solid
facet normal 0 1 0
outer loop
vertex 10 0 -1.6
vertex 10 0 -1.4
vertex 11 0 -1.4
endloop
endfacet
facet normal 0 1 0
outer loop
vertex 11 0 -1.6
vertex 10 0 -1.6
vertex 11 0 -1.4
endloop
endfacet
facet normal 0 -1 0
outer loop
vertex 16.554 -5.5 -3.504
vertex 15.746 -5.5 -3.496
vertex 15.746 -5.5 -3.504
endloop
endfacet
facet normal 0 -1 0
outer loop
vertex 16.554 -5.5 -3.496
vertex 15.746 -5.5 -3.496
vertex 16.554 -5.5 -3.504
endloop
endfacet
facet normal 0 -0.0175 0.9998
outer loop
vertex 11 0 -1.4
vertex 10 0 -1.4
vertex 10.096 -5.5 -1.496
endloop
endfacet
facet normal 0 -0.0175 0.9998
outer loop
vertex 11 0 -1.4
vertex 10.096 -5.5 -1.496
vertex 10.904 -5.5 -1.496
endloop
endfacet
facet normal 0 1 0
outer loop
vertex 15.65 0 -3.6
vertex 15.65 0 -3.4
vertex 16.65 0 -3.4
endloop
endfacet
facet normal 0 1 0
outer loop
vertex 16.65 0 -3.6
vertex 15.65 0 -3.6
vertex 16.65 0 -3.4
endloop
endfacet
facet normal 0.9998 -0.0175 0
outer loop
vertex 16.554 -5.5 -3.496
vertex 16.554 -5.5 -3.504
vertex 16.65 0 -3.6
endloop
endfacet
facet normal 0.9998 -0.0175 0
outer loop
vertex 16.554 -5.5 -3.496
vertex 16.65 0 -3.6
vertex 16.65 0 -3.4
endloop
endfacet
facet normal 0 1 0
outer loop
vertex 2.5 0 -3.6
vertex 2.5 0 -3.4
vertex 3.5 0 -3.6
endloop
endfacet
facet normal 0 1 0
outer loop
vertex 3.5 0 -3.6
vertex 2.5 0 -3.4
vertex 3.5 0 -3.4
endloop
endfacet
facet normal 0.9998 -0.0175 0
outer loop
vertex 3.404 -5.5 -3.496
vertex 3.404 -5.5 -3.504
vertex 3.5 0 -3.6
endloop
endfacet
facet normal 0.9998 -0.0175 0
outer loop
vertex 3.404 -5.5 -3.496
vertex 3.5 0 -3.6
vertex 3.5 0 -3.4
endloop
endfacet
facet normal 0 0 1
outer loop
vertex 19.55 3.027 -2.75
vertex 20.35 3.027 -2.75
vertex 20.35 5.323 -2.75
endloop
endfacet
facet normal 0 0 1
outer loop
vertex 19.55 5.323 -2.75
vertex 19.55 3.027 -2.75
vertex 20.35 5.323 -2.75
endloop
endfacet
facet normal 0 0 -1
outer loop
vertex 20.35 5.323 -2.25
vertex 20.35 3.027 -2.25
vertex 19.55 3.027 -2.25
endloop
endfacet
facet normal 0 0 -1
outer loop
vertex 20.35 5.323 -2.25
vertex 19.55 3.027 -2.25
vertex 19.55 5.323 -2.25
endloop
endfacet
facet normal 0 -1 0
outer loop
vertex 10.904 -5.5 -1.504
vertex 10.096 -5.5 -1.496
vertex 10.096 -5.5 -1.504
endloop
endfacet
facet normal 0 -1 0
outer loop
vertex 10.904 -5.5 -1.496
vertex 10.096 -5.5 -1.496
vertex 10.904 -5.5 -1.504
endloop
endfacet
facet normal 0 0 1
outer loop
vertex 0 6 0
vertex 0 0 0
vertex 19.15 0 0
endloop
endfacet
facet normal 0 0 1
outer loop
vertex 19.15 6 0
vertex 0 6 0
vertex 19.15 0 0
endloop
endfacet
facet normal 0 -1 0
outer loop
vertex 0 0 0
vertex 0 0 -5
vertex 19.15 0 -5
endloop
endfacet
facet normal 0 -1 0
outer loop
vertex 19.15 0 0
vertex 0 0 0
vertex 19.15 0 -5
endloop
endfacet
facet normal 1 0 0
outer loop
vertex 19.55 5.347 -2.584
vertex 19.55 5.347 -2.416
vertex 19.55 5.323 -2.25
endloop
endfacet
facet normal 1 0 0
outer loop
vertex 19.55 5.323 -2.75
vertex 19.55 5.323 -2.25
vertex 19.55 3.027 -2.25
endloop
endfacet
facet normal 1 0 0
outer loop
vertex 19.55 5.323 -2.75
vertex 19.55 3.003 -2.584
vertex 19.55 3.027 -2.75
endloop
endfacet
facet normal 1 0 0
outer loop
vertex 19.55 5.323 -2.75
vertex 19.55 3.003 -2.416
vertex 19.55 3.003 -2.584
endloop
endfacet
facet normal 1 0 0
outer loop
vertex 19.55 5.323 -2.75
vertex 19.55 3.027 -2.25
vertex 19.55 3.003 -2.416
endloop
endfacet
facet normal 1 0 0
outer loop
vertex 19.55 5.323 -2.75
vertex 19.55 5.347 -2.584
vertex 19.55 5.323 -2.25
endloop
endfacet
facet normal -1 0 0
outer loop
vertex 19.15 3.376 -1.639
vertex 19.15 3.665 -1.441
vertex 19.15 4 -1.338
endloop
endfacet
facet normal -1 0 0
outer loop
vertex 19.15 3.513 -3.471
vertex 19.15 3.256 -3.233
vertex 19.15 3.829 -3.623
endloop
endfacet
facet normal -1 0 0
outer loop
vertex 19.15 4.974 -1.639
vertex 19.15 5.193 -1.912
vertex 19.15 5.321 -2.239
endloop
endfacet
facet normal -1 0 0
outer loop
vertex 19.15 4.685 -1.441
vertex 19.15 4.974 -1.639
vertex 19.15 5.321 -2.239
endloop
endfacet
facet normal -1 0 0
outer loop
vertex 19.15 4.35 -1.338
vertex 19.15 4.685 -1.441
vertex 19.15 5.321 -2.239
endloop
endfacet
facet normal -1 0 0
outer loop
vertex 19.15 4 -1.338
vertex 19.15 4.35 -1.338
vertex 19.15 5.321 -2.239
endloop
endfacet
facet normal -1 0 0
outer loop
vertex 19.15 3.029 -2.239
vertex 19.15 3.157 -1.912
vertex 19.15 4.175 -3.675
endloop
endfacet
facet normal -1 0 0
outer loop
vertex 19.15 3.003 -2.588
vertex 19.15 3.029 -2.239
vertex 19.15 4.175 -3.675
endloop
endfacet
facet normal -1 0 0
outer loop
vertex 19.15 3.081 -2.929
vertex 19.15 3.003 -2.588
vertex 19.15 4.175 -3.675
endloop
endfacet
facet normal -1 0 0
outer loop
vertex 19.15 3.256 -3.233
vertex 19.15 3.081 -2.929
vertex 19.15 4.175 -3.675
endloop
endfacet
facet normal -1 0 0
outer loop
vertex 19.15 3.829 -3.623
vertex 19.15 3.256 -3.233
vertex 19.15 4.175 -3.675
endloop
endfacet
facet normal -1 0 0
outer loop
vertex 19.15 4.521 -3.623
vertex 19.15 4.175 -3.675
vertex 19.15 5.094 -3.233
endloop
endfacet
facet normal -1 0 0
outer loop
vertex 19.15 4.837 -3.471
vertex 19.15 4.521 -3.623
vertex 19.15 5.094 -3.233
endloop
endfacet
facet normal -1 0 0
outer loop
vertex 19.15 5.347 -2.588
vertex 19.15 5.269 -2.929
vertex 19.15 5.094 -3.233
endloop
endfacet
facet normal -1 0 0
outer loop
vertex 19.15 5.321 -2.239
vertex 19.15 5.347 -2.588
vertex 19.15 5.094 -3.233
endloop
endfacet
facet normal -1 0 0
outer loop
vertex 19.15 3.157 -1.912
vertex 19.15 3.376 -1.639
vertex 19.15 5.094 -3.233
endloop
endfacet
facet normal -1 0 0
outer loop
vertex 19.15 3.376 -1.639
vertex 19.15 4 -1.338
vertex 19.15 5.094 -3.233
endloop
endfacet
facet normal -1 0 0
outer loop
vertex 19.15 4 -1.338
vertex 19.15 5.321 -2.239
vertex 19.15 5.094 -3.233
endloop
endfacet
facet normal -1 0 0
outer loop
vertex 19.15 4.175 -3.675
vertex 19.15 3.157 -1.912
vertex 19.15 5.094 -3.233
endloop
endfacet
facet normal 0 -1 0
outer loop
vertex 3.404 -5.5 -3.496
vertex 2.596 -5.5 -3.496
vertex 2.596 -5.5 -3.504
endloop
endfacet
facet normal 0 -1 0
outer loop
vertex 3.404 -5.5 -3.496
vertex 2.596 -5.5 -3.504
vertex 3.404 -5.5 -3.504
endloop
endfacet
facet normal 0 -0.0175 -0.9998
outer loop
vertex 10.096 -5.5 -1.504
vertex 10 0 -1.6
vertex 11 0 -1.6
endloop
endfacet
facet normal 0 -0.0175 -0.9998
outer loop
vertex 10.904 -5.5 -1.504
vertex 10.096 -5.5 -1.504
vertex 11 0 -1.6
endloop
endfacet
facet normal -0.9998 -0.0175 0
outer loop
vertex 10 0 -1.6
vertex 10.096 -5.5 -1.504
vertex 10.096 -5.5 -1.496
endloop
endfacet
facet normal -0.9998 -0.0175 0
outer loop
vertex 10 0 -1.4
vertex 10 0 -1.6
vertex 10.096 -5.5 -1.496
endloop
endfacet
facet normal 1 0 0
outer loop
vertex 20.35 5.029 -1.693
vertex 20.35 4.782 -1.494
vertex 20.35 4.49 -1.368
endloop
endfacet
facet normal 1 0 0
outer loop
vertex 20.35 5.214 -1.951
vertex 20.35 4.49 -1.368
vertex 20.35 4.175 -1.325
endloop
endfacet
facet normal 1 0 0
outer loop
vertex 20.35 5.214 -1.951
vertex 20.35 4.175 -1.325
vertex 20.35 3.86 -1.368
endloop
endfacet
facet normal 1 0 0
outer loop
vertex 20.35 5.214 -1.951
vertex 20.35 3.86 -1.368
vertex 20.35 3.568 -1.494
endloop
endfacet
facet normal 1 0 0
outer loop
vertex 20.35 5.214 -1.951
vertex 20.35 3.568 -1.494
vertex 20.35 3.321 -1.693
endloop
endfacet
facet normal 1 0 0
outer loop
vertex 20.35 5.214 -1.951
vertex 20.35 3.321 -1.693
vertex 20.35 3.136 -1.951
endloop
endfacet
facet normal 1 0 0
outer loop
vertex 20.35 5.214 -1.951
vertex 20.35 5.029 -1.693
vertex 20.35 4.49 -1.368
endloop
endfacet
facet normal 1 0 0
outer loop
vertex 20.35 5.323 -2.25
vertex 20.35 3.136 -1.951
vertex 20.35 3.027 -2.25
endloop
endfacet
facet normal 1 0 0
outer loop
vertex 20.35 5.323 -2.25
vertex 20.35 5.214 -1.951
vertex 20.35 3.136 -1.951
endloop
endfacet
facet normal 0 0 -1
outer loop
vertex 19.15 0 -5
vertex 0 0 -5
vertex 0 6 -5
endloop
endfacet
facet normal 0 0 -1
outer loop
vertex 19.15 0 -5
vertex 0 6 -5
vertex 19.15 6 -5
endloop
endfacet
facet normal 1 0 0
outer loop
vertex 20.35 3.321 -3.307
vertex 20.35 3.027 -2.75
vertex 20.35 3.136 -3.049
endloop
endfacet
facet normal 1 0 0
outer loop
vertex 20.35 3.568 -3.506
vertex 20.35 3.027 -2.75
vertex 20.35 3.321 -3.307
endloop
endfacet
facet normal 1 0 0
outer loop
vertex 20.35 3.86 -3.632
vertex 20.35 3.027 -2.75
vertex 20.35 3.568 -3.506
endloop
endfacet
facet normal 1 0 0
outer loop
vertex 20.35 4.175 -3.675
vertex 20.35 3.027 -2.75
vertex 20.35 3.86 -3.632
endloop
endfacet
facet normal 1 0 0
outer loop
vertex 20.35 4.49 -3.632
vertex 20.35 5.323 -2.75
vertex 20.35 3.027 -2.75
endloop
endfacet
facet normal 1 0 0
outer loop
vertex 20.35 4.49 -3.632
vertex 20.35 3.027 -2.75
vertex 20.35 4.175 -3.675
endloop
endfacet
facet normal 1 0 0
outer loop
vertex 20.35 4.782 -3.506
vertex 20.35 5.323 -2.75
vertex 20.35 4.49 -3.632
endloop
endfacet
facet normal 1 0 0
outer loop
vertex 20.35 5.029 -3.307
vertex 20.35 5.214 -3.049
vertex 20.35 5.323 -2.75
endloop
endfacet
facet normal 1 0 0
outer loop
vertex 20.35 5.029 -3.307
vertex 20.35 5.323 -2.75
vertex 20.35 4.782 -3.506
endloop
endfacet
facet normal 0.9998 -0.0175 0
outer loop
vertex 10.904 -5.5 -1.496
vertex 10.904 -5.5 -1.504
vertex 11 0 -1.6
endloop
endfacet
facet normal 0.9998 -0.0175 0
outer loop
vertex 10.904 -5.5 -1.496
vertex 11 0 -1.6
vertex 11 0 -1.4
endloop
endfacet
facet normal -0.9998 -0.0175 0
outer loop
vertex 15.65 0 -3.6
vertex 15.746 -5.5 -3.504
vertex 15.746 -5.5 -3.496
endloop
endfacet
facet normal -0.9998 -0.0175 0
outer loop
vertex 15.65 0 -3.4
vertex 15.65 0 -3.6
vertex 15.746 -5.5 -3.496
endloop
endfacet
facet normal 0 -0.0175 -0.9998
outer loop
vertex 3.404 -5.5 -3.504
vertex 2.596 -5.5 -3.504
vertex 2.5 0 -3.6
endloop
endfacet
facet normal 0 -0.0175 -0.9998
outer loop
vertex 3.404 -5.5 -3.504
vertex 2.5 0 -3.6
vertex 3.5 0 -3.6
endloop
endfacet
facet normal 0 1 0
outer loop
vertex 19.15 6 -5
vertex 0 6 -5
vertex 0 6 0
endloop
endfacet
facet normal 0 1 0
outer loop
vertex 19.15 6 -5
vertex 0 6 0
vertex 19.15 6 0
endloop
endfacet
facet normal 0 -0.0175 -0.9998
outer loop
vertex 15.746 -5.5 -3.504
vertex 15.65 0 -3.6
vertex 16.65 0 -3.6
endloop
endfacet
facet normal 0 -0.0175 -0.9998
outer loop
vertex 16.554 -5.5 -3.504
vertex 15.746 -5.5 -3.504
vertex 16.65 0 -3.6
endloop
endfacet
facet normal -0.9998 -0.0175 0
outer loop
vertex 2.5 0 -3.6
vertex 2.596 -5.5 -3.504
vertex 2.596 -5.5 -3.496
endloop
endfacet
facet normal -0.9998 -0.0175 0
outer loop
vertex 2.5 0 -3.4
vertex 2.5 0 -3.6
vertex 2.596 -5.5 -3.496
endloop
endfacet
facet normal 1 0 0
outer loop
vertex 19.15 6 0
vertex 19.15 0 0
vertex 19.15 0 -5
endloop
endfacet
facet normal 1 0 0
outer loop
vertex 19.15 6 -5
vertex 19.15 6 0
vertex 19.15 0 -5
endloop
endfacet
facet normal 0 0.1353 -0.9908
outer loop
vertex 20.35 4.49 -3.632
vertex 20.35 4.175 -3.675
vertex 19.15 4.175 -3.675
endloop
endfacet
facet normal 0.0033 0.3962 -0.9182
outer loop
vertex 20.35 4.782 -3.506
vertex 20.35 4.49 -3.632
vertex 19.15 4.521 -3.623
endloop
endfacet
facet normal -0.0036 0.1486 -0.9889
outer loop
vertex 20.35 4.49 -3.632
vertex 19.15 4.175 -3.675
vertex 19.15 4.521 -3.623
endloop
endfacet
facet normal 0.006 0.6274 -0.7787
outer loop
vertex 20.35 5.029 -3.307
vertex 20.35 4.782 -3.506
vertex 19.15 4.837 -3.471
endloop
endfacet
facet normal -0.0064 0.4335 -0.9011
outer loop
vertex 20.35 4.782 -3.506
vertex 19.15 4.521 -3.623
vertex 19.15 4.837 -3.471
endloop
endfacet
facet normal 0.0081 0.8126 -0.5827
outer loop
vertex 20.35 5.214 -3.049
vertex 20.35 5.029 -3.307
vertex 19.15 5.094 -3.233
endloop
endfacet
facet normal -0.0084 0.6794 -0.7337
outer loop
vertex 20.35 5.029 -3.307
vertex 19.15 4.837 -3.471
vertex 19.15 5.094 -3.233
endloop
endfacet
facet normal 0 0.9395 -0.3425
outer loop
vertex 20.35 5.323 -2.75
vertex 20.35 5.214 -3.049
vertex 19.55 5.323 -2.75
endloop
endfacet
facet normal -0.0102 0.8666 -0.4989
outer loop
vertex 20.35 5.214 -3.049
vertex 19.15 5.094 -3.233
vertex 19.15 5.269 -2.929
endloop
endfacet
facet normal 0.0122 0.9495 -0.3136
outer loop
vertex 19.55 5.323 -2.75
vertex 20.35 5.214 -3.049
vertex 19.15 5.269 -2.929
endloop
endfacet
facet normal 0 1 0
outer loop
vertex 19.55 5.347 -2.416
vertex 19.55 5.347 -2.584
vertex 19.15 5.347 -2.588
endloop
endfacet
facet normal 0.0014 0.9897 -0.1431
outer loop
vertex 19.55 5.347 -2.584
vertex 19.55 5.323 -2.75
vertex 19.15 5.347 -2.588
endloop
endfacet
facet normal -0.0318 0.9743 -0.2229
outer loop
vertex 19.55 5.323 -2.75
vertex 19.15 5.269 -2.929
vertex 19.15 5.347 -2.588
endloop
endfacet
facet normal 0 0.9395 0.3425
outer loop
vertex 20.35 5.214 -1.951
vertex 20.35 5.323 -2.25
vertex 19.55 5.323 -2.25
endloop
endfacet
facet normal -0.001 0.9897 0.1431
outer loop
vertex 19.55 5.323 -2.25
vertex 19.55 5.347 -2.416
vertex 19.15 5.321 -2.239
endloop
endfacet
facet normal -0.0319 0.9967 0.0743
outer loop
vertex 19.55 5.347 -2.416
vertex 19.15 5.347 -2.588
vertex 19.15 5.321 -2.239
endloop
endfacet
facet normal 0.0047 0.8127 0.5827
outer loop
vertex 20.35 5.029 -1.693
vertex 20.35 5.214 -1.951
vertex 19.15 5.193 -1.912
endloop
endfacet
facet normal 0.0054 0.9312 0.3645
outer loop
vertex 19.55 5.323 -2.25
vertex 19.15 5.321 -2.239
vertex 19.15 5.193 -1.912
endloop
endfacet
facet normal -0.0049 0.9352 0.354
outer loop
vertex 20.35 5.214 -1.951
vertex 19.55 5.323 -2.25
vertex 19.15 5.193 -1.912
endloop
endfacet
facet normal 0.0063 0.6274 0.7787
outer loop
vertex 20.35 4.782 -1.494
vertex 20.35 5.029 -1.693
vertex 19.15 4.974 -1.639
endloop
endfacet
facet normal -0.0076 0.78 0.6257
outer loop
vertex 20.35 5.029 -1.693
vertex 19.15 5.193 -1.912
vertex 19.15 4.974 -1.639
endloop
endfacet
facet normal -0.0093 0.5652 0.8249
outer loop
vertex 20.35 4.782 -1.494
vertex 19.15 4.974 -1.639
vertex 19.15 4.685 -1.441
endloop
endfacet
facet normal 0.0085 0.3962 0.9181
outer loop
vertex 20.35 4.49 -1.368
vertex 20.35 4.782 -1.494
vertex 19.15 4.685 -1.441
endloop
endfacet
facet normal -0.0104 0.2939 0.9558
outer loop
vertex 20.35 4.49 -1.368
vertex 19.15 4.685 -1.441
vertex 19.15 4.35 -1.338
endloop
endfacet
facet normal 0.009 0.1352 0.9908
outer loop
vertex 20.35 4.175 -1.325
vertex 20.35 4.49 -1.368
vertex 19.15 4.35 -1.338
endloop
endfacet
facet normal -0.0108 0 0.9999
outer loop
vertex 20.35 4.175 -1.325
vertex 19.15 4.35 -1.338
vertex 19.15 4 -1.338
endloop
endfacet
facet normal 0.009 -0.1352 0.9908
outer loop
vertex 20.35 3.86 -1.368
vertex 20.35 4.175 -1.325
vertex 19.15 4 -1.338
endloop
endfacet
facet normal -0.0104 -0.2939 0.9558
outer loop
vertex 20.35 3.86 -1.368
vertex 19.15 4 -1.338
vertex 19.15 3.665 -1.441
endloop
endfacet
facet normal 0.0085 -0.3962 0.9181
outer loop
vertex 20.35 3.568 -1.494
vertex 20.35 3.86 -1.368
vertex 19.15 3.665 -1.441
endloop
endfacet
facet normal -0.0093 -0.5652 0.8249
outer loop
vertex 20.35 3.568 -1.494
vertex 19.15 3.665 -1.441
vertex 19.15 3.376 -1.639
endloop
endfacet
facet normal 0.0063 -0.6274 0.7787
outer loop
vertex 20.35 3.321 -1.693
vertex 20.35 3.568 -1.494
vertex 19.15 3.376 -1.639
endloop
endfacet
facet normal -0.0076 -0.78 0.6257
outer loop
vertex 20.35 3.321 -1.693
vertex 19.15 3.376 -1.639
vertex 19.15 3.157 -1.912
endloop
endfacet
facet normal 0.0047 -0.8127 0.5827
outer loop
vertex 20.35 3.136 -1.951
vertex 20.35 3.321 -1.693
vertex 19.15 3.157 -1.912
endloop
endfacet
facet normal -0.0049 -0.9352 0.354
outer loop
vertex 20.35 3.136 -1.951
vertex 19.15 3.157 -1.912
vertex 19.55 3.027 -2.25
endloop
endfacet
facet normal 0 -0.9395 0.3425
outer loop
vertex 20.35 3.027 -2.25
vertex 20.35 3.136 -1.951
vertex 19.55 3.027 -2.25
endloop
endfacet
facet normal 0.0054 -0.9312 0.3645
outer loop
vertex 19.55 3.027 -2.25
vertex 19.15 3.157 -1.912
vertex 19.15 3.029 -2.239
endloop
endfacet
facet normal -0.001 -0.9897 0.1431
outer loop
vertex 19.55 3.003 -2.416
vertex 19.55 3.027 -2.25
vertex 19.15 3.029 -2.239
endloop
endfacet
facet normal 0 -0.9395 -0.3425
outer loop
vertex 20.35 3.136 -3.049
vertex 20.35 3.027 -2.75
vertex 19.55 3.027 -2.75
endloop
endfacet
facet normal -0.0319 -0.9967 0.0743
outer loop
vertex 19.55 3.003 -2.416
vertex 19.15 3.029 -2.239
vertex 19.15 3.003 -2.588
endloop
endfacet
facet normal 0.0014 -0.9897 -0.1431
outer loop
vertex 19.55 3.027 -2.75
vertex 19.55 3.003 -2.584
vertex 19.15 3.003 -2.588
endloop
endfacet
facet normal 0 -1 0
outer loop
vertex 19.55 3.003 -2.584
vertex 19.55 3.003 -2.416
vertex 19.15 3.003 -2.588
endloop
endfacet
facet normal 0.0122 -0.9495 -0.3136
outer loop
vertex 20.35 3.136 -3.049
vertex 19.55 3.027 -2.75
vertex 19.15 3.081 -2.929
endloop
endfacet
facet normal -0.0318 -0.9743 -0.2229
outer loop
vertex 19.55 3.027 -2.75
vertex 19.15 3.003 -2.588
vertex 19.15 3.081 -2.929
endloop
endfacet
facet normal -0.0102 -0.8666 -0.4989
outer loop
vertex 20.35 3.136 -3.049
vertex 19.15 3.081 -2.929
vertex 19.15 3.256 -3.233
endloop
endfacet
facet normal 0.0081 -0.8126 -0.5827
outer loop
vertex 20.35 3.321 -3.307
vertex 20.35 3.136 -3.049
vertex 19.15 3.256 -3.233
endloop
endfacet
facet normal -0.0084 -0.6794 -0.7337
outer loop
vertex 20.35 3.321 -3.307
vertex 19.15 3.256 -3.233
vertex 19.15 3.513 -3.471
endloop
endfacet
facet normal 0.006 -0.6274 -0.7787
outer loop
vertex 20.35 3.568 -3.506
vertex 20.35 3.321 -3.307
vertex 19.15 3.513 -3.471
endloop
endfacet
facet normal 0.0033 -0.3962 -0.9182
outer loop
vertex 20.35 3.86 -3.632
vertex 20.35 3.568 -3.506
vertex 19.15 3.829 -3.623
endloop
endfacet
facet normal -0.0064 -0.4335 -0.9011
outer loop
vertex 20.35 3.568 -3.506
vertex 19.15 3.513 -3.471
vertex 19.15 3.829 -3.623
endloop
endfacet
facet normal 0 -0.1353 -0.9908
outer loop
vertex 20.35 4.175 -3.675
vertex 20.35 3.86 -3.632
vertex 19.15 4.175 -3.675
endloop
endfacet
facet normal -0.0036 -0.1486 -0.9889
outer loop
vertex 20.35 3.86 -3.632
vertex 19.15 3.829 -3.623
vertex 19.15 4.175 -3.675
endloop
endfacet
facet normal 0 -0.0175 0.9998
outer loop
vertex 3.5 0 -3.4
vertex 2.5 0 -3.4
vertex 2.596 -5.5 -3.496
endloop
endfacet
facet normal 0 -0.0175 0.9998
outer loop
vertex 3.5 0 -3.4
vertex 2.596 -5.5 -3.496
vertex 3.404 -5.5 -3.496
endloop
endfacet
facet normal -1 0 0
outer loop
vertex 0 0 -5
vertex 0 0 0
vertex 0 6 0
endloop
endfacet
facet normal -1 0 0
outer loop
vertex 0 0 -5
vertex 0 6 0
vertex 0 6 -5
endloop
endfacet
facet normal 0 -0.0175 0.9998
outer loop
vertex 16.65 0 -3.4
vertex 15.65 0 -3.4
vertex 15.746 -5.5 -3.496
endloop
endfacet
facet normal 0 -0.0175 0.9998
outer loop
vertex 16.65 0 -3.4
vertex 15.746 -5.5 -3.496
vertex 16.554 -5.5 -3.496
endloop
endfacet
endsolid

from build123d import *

# Parameters (mm, degrees)
SKETCH1_W                     = 19.15
SKETCH1_H                     = 5
BOSS_EXTRUDE1_DEPTH           = 6
SKETCH3_R                     = 1.175
BOSS_EXTRUDE2_DEPTH           = 1.2
SKETCH4_W                     = 0.5
SKETCH4_H                     = 2.35
CUT_EXTRUDE1_DEPTH            = 0.8
SKETCH5_W                     = 1
SKETCH5_H                     = 0.2
BOSS_EXTRUDE3_DEPTH           = 5.5
BOSS_EXTRUDE3_DRAFT           = 1
BOSS_EXTRUDE3_PROFILE_2_DEPTH = 5.5
BOSS_EXTRUDE3_PROFILE_2_DRAFT = 1
BOSS_EXTRUDE3_PROFILE_3_DEPTH = 5.5
BOSS_EXTRUDE3_PROFILE_3_DRAFT = 1


with BuildPart() as part:
    # Sketch1 → Boss-Extrude1 (new body)
    with BuildSketch(Plane(origin=(0, 0, 0), x_dir=(1, 0, 0), z_dir=(0, 1, 0))):
        with Locations((9.575, 2.5)):
            Rectangle(SKETCH1_W, SKETCH1_H)
    extrude(amount=BOSS_EXTRUDE1_DEPTH)


with BuildPart() as body_2:
    # Sketch3 → Boss-Extrude2 (new body)
    with BuildSketch(Plane(origin=(19.15, 0, 0), x_dir=(0, 0, -1), z_dir=(1, 0, 0))):
        with Locations((2.5, 4.175)):
            Circle(SKETCH3_R)
    extrude(amount=BOSS_EXTRUDE2_DEPTH)

    # Sketch4 → Cut-Extrude1 (cut)
    with BuildSketch(Plane(origin=(20.35, 0, 0), x_dir=(0, 0, -1), z_dir=(1, 0, 0))):
        with Locations((2.5, 4.175)):
            Rectangle(SKETCH4_W, SKETCH4_H)
    extrude(amount=-CUT_EXTRUDE1_DEPTH, mode=Mode.SUBTRACT)


with BuildPart() as body_3:
    # Sketch5 → Boss-Extrude3 (with draft: the straight prism first)
    with BuildSketch(Plane.XZ):
        with Locations((3, -3.5)):
            Rectangle(SKETCH5_W, SKETCH5_H)
    extrude(amount=BOSS_EXTRUDE3_DEPTH)
    # Boss-Extrude3: the draft: its side faces are tilted about the plane it starts from
    boss_extrude3_sides = [body_3.faces().sort_by_distance(p)[0] for p in [
        (3, -2.75, -3.6),
        (3.5, -2.75, -3.5),
        (3, -2.75, -3.4),
        (2.5, -2.75, -3.5),
    ]]
    draft(boss_extrude3_sides, Plane.XZ, BOSS_EXTRUDE3_DRAFT)


with BuildPart() as body_4:
    # Sketch5 → Boss-Extrude3 profile 2 (with draft: the straight prism first)
    with BuildSketch(Plane.XZ):
        with Locations((10.5, -1.5)):
            Rectangle(SKETCH5_W, SKETCH5_H)
    extrude(amount=BOSS_EXTRUDE3_PROFILE_2_DEPTH)
    # Boss-Extrude3 profile 2: the draft: its side faces are tilted about the plane it starts from
    boss_extrude3_profile_2_sides = [body_4.faces().sort_by_distance(p)[0] for p in [
        (10.5, -2.75, -1.6),
        (11, -2.75, -1.5),
        (10.5, -2.75, -1.4),
        (10, -2.75, -1.5),
    ]]
    draft(boss_extrude3_profile_2_sides, Plane.XZ, BOSS_EXTRUDE3_PROFILE_2_DRAFT)


with BuildPart() as body_5:
    # Sketch5 → Boss-Extrude3 profile 3 (with draft: the straight prism first)
    with BuildSketch(Plane.XZ):
        with Locations((16.15, -3.5)):
            Rectangle(SKETCH5_W, SKETCH5_H)
    extrude(amount=BOSS_EXTRUDE3_PROFILE_3_DEPTH)
    # Boss-Extrude3 profile 3: the draft: its side faces are tilted about the plane it starts from
    boss_extrude3_profile_3_sides = [body_5.faces().sort_by_distance(p)[0] for p in [
        (16.15, -2.75, -3.6),
        (16.65, -2.75, -3.5),
        (16.15, -2.75, -3.4),
        (15.65, -2.75, -3.5),
    ]]
    draft(boss_extrude3_profile_3_sides, Plane.XZ, BOSS_EXTRUDE3_PROFILE_3_DRAFT)


solid = Compound([part.part, body_2.part, body_3.part, body_4.part, body_5.part])
